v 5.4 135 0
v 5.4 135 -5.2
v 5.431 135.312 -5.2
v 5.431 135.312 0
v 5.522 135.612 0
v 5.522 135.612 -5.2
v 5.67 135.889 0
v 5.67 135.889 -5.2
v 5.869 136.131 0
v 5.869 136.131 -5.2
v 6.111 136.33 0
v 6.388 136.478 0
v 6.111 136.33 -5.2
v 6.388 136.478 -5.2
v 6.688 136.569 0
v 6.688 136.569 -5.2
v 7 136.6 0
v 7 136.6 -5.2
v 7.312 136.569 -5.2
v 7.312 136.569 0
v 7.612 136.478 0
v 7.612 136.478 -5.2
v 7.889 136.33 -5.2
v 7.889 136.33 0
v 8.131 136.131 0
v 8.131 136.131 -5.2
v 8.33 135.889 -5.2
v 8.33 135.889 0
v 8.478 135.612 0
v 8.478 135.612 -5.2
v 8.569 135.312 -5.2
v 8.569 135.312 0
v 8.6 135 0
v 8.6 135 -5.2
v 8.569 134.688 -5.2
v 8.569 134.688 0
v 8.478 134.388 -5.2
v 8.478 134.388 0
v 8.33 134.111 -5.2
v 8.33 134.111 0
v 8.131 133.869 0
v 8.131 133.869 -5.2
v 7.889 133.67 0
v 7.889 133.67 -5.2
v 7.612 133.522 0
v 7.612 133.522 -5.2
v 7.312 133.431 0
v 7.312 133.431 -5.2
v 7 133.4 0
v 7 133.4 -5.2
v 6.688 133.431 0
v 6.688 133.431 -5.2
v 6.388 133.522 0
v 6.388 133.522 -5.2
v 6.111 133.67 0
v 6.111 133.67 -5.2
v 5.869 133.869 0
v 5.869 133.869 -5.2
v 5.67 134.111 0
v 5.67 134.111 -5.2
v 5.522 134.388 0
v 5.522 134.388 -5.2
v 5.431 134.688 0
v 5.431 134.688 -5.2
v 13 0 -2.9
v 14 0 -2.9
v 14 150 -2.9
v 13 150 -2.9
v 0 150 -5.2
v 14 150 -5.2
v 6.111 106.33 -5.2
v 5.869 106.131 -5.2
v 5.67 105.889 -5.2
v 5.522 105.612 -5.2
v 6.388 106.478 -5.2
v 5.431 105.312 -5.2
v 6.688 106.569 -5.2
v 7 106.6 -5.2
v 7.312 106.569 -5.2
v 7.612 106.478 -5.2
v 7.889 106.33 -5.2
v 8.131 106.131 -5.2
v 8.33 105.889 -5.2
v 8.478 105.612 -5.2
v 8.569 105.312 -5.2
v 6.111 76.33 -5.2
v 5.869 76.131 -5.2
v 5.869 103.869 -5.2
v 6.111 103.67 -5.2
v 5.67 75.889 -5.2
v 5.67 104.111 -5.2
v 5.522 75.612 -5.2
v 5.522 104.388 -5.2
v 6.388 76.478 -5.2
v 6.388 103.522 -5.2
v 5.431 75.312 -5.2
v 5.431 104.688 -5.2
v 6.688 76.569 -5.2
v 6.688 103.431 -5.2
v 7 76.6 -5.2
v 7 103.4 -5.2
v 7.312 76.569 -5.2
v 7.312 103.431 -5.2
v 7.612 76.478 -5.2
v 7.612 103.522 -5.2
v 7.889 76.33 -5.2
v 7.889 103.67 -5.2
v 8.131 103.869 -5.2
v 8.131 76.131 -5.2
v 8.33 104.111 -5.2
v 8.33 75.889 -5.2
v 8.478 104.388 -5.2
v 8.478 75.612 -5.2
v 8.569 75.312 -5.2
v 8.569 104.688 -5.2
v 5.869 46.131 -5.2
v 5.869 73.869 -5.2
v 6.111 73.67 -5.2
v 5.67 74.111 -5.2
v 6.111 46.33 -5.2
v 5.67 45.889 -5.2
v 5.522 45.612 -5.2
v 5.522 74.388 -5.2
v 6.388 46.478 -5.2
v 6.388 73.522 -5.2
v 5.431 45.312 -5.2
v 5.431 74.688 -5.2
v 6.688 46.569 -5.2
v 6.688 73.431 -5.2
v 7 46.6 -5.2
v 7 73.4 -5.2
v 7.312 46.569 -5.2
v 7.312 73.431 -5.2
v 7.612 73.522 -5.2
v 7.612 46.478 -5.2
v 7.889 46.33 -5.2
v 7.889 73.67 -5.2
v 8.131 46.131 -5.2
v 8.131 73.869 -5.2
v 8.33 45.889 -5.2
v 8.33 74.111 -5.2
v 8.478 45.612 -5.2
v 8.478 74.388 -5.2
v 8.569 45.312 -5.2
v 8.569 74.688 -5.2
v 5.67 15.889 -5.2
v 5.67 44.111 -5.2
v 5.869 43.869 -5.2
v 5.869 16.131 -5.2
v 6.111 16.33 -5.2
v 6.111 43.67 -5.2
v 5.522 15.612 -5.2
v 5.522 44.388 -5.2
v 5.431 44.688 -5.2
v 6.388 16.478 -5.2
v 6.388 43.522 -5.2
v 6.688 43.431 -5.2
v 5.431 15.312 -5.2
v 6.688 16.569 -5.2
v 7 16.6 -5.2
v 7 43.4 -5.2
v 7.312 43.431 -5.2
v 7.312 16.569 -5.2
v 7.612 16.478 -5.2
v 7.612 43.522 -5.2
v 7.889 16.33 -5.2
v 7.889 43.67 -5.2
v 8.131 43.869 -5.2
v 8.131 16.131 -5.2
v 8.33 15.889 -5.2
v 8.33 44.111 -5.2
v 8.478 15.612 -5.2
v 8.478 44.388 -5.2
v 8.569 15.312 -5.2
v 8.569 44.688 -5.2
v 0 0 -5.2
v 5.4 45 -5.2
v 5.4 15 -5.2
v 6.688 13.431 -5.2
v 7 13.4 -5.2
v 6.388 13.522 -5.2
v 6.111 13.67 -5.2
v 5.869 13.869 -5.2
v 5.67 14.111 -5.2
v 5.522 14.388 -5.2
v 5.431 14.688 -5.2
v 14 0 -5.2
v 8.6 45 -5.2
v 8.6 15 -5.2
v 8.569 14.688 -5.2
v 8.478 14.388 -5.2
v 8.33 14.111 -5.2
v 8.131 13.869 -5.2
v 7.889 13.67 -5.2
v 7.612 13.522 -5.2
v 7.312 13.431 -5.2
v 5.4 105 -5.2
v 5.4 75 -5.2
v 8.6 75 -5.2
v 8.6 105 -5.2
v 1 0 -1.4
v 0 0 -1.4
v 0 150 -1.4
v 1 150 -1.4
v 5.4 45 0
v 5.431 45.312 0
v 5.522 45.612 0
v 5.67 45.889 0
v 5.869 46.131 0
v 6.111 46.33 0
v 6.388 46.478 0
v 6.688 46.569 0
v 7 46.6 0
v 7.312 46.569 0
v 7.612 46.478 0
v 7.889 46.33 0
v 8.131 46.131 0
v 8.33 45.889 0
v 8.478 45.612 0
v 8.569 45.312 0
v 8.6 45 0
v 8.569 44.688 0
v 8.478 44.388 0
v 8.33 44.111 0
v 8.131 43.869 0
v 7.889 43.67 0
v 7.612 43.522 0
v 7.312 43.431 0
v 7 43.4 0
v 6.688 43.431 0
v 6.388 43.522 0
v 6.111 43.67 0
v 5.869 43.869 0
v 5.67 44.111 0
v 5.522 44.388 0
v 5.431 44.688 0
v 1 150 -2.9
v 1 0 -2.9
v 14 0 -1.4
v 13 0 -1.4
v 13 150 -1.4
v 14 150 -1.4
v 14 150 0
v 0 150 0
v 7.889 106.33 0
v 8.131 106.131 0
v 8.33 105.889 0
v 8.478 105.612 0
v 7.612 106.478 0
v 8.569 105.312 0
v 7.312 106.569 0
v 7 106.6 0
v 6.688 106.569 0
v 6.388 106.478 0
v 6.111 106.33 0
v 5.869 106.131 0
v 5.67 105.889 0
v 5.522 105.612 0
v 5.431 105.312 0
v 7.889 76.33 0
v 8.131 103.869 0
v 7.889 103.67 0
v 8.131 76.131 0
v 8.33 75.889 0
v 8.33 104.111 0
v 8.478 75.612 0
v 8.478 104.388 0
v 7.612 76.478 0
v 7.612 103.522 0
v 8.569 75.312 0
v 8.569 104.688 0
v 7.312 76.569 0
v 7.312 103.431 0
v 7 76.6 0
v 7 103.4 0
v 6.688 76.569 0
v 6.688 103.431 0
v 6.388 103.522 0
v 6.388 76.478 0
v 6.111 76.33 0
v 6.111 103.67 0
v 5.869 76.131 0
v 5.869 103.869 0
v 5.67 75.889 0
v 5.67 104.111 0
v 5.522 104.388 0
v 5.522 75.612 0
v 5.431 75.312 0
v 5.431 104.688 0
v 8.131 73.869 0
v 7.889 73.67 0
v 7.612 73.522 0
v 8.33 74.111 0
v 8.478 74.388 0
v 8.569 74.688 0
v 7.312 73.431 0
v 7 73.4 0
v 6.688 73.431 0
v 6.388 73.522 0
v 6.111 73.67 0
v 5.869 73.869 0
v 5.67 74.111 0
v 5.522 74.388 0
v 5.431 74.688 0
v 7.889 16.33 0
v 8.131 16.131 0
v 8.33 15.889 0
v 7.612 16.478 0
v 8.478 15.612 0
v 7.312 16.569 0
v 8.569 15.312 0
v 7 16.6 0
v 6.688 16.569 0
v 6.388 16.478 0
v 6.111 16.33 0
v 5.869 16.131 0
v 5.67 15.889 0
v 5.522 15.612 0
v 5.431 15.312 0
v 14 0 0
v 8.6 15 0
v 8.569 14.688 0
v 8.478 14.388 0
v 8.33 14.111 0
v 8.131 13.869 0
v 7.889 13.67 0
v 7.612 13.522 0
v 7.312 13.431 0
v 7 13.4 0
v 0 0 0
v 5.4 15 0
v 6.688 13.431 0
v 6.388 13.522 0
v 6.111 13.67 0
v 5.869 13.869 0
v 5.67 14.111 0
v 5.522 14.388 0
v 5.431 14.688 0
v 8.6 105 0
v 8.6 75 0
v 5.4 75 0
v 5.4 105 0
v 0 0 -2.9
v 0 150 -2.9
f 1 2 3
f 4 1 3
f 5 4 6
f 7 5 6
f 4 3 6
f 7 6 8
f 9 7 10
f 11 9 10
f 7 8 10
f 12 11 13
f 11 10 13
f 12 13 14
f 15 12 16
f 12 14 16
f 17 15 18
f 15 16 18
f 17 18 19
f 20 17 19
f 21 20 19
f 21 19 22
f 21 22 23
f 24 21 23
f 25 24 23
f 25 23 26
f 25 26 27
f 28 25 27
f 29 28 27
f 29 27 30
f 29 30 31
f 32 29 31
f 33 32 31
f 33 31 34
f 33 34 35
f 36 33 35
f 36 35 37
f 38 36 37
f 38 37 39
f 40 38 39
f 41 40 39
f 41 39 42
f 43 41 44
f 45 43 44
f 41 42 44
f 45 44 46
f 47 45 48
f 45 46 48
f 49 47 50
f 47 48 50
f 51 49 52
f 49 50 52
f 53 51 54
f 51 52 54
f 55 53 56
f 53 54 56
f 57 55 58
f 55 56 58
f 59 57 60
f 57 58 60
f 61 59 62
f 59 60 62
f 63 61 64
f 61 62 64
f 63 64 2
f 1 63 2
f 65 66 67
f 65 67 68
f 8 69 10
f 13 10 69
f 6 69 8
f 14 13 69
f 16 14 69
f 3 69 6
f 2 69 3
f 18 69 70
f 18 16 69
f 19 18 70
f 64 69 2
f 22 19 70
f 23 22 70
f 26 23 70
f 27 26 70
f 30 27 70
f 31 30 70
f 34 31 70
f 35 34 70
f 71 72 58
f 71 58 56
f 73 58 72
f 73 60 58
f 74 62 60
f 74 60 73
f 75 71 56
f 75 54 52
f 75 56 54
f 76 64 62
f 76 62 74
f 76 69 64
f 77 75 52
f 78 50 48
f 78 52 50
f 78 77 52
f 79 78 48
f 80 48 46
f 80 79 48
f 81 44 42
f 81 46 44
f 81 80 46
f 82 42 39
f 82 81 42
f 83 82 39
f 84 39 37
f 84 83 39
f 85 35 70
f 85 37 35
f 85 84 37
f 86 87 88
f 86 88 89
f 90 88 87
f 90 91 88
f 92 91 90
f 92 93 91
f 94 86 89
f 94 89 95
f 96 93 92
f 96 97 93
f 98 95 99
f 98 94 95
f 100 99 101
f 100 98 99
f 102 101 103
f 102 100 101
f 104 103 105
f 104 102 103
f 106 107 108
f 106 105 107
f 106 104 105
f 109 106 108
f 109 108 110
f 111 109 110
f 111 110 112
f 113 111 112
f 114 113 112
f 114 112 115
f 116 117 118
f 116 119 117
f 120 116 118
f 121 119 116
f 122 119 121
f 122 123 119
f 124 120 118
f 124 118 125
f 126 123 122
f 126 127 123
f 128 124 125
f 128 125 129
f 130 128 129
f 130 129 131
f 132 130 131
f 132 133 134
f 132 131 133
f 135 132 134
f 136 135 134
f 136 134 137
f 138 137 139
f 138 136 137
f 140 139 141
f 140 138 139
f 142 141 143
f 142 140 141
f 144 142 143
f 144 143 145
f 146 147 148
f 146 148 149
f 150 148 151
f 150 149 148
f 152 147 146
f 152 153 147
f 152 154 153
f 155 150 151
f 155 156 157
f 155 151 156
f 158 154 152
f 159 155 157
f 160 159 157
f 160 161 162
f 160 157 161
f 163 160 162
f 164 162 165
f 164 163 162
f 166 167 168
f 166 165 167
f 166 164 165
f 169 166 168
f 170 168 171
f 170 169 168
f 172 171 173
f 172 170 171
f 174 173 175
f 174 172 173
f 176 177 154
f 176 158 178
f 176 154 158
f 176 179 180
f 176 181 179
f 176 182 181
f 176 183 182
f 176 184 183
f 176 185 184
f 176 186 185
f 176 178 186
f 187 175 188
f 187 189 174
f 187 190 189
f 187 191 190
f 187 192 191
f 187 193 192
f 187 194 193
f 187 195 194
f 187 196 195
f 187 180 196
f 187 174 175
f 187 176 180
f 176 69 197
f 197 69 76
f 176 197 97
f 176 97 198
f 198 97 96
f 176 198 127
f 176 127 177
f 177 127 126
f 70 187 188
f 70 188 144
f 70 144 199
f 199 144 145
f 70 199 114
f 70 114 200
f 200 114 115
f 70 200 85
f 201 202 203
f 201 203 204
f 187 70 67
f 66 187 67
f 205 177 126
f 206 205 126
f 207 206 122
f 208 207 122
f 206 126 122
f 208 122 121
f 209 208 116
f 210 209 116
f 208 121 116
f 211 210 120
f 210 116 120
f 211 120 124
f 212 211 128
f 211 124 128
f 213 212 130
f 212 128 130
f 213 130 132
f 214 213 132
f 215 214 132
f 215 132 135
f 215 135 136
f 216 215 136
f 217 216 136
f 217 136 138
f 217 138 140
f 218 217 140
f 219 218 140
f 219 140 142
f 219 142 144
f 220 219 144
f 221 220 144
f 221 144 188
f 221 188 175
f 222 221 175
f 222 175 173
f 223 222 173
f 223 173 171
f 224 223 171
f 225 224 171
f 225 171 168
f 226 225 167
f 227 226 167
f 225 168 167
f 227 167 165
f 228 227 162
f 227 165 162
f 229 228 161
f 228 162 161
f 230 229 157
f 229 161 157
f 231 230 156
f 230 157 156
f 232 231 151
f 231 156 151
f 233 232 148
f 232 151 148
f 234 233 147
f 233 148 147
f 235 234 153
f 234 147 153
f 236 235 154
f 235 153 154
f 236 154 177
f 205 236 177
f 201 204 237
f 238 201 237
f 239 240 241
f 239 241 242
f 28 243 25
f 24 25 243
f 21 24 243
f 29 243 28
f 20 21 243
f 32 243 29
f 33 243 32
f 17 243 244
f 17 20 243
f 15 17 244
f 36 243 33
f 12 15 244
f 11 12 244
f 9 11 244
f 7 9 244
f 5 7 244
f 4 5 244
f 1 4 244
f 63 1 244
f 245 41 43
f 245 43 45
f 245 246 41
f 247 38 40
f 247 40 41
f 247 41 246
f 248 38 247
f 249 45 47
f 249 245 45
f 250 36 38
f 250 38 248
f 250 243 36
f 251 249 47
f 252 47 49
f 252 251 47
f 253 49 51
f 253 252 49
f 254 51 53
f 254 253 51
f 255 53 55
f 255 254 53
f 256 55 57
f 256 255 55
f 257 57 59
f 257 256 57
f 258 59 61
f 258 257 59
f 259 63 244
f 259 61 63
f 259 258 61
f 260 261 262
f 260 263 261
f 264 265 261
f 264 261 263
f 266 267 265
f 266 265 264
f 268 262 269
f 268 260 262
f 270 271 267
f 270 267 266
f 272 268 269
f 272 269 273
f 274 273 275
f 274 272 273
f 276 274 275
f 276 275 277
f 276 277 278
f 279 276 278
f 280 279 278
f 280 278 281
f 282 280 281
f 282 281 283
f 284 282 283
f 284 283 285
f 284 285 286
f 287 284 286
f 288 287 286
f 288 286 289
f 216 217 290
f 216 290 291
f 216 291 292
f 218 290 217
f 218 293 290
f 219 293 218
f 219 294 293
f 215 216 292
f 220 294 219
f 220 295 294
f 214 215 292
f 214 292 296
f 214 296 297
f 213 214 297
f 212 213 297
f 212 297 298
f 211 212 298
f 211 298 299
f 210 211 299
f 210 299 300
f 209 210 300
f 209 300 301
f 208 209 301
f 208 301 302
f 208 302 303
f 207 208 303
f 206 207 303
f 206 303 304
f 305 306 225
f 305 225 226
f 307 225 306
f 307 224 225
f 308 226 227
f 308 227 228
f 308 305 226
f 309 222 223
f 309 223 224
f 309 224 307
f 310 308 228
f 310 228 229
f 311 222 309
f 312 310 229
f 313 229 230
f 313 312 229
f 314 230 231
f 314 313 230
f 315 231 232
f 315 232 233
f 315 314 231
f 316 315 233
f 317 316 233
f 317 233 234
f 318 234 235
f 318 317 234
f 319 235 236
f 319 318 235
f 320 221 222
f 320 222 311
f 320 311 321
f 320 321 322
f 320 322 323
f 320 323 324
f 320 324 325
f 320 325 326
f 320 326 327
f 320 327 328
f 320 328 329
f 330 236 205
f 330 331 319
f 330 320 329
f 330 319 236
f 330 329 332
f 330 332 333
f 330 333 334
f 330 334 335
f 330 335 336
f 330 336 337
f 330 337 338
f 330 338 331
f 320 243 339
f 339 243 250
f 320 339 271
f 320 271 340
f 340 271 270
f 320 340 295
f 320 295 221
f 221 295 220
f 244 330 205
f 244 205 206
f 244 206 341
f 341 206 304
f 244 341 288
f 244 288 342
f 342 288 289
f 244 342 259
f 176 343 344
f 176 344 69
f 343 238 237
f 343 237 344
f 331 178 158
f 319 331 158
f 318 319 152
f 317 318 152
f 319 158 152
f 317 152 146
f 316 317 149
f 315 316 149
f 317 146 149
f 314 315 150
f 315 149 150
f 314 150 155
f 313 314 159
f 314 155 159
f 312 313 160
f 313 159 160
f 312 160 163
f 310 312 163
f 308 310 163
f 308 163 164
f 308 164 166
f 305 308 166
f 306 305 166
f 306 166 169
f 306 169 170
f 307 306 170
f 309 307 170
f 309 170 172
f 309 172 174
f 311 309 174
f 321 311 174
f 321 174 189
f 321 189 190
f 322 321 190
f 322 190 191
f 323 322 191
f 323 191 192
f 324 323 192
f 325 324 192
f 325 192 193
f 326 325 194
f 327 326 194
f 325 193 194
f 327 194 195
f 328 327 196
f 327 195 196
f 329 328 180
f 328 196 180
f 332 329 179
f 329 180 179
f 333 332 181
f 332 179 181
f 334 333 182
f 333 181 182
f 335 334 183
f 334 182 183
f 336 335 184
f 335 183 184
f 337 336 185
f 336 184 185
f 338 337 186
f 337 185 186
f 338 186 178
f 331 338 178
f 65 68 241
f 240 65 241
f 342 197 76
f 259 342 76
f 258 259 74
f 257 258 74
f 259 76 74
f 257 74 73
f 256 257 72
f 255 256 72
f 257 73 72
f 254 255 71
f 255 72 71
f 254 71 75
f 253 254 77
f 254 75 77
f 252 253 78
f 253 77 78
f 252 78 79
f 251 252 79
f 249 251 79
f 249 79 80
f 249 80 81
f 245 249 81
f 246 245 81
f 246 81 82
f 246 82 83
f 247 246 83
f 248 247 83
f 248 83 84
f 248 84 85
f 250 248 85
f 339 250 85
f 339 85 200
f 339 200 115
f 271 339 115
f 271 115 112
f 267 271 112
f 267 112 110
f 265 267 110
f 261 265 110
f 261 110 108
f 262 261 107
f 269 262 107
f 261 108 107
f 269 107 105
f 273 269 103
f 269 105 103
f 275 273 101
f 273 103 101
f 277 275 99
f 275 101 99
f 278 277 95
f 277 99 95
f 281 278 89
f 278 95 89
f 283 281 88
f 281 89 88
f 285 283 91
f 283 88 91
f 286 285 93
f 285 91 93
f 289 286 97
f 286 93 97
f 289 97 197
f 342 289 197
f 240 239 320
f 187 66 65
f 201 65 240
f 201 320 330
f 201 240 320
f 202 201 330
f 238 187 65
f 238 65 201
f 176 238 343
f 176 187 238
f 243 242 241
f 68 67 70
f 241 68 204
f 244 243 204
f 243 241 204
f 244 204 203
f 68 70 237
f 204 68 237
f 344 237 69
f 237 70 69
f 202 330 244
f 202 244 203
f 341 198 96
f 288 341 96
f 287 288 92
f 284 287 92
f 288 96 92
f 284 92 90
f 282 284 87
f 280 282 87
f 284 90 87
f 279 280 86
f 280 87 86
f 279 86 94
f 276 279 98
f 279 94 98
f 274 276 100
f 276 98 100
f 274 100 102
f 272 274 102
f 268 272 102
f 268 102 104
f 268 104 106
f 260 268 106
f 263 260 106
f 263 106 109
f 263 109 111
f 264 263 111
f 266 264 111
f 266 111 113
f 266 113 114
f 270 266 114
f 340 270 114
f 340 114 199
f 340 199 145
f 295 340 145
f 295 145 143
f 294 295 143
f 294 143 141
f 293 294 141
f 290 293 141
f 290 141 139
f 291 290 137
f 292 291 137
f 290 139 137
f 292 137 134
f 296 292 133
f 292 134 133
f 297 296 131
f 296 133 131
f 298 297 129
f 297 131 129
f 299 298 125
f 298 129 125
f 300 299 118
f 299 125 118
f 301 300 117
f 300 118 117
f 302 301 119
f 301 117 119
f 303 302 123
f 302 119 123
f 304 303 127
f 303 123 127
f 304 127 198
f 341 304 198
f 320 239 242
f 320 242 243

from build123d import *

# Parameters (mm, degrees)
EXTRUDE_1_DEPTH     = 150
SKETCH_2_R          = 1.6
CUT_EXTRUDE_1_DEPTH = 151.741633267


with BuildPart() as part:
    # 草图1 → 凸台-拉伸1 (new body)
    with BuildSketch(Plane(origin=(0, 0, 0), x_dir=(1, 0, 0), z_dir=(0, 1, 0))):
        Polygon((0, 0), (0, 1.4), (1, 1.4), (1, 2.9), (0, 2.9), (0, 5.2), (14, 5.2), (14, 2.9), (13, 2.9), (13, 1.4), (14, 1.4), (14, 0), align=None)
    extrude(amount=EXTRUDE_1_DEPTH)

    # 草图2 → 切除-拉伸1 (cut, through all)
    with BuildSketch(Plane(origin=(0, 0, -5.2), x_dir=(-1, 0, 0), z_dir=(0, 0, -1))):
        with Locations((-7, 15)):
            Circle(SKETCH_2_R)
        with Locations((-7, 45)):
            Circle(SKETCH_2_R)
        with Locations((-7, 75)):
            Circle(SKETCH_2_R)
        with Locations((-7, 105)):
            Circle(SKETCH_2_R)
        with Locations((-7, 135)):
            Circle(SKETCH_2_R)
    extrude(amount=-CUT_EXTRUDE_1_DEPTH, mode=Mode.SUBTRACT)


solid = part.part
